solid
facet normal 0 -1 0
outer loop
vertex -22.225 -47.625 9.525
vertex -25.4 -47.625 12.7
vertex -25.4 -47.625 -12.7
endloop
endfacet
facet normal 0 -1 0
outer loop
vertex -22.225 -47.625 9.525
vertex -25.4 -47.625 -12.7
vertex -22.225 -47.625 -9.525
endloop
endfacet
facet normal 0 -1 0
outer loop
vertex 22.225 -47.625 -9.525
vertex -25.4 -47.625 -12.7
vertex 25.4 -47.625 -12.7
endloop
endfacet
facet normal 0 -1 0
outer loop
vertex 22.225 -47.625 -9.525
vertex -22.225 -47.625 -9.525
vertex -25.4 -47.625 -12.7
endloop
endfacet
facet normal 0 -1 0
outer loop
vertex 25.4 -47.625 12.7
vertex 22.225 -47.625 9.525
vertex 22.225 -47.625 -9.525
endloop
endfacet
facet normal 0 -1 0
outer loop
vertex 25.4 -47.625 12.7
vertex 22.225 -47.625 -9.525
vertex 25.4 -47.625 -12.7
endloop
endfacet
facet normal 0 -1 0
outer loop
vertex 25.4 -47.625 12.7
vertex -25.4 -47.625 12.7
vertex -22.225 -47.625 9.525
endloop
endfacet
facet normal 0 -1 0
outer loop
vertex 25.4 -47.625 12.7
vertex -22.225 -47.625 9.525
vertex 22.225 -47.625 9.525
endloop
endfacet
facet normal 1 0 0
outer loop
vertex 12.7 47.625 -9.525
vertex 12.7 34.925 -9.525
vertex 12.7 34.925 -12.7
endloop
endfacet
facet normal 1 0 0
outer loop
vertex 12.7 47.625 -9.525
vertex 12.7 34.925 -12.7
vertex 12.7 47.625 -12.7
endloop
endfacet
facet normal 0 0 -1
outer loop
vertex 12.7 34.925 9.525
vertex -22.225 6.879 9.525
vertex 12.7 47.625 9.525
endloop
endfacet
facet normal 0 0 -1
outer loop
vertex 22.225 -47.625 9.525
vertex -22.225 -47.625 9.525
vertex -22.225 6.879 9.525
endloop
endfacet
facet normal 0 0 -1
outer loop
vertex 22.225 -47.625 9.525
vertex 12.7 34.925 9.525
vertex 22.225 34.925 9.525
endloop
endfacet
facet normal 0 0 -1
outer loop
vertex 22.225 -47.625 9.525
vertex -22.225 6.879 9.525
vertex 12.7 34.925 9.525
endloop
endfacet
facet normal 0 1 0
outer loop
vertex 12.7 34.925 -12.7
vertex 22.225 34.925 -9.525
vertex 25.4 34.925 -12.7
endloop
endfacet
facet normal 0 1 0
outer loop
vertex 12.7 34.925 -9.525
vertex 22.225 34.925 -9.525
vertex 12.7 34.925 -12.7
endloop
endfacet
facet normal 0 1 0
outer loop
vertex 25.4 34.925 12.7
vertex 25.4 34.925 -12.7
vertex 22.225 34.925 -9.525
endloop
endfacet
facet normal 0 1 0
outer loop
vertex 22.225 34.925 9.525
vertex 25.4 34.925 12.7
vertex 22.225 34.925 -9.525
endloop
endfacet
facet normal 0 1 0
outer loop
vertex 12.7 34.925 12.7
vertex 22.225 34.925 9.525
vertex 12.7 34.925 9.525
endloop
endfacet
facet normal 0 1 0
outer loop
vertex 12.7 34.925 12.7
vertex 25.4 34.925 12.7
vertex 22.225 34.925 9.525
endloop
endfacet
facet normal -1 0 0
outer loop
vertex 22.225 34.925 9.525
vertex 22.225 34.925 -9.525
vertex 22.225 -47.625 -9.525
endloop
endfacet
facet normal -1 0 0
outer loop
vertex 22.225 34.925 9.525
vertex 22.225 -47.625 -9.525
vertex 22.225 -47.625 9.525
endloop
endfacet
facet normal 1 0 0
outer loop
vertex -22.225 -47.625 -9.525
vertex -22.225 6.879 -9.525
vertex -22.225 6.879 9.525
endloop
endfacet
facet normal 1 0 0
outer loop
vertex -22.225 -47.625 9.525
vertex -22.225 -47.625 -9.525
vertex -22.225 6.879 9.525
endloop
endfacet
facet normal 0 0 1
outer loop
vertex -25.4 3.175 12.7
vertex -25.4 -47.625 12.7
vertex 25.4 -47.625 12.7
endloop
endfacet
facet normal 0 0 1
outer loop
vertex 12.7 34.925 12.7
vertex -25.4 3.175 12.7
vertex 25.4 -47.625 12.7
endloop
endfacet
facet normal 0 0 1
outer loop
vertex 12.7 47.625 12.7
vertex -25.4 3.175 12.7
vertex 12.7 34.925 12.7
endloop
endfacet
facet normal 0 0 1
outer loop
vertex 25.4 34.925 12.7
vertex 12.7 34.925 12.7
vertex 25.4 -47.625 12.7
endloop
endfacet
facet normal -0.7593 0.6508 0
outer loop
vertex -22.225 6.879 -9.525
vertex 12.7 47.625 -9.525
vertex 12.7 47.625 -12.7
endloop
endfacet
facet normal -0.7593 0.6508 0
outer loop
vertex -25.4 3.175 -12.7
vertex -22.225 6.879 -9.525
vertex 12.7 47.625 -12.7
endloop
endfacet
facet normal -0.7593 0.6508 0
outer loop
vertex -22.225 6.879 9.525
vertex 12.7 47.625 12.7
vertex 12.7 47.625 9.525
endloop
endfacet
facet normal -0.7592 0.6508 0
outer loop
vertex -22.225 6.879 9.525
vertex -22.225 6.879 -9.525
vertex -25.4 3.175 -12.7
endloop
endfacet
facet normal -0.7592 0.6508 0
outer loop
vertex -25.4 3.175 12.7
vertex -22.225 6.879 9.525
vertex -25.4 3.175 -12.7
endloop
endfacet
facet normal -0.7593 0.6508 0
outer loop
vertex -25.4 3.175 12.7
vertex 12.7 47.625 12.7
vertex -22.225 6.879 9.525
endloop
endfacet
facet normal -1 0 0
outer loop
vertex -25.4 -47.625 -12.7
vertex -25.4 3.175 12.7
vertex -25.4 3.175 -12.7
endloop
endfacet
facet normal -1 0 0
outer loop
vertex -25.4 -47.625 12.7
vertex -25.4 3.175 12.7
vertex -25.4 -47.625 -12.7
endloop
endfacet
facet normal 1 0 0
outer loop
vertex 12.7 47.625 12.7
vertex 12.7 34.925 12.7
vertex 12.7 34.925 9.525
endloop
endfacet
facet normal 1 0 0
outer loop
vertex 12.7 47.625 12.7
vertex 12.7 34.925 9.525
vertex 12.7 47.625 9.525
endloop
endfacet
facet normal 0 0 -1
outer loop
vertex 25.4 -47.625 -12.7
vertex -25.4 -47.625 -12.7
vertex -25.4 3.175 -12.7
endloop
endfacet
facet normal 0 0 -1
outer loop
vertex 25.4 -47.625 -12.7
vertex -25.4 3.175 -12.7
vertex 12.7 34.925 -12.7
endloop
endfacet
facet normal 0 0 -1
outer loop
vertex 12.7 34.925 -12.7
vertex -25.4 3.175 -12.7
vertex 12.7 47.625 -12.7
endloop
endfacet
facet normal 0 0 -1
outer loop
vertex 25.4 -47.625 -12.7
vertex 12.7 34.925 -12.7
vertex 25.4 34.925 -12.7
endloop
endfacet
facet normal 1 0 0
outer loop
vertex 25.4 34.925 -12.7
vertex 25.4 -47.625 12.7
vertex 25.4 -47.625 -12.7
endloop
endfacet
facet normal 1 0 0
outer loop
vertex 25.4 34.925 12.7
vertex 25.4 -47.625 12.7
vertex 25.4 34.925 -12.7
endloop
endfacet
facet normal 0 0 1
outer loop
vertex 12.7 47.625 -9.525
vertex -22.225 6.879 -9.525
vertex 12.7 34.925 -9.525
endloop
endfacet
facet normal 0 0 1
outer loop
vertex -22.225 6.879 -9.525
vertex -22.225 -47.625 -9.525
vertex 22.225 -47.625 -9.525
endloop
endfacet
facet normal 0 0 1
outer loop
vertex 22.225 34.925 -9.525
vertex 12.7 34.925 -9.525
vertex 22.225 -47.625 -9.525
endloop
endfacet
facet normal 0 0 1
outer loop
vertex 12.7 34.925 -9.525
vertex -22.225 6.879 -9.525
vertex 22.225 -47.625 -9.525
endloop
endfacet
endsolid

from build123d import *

# Parameters (mm, degrees)
BOSS_EXTRUDE1_DEPTH = 12.7
SKETCH2_W           = 44.45
SKETCH2_H           = 19.05
CUT_EXTRUDE1_DEPTH  = 100.3932216


with BuildPart() as part:
    # Sketch1 → Boss-Extrude1 (new, symmetric)
    with BuildSketch(Plane.XY):
        Polygon((-25.4, -47.625), (25.4, -47.625), (25.4, 34.925), (12.7, 34.925), (12.7, 47.625), (-25.4, 3.175), align=None)
    extrude(amount=BOSS_EXTRUDE1_DEPTH, both=True)

    # Sketch2 → Cut-Extrude1 (cut, through all)
    with BuildSketch(Plane.XZ.offset(47.625)):
        Rectangle(SKETCH2_W, SKETCH2_H)
    extrude(amount=-CUT_EXTRUDE1_DEPTH, mode=Mode.SUBTRACT)


solid = part.part
